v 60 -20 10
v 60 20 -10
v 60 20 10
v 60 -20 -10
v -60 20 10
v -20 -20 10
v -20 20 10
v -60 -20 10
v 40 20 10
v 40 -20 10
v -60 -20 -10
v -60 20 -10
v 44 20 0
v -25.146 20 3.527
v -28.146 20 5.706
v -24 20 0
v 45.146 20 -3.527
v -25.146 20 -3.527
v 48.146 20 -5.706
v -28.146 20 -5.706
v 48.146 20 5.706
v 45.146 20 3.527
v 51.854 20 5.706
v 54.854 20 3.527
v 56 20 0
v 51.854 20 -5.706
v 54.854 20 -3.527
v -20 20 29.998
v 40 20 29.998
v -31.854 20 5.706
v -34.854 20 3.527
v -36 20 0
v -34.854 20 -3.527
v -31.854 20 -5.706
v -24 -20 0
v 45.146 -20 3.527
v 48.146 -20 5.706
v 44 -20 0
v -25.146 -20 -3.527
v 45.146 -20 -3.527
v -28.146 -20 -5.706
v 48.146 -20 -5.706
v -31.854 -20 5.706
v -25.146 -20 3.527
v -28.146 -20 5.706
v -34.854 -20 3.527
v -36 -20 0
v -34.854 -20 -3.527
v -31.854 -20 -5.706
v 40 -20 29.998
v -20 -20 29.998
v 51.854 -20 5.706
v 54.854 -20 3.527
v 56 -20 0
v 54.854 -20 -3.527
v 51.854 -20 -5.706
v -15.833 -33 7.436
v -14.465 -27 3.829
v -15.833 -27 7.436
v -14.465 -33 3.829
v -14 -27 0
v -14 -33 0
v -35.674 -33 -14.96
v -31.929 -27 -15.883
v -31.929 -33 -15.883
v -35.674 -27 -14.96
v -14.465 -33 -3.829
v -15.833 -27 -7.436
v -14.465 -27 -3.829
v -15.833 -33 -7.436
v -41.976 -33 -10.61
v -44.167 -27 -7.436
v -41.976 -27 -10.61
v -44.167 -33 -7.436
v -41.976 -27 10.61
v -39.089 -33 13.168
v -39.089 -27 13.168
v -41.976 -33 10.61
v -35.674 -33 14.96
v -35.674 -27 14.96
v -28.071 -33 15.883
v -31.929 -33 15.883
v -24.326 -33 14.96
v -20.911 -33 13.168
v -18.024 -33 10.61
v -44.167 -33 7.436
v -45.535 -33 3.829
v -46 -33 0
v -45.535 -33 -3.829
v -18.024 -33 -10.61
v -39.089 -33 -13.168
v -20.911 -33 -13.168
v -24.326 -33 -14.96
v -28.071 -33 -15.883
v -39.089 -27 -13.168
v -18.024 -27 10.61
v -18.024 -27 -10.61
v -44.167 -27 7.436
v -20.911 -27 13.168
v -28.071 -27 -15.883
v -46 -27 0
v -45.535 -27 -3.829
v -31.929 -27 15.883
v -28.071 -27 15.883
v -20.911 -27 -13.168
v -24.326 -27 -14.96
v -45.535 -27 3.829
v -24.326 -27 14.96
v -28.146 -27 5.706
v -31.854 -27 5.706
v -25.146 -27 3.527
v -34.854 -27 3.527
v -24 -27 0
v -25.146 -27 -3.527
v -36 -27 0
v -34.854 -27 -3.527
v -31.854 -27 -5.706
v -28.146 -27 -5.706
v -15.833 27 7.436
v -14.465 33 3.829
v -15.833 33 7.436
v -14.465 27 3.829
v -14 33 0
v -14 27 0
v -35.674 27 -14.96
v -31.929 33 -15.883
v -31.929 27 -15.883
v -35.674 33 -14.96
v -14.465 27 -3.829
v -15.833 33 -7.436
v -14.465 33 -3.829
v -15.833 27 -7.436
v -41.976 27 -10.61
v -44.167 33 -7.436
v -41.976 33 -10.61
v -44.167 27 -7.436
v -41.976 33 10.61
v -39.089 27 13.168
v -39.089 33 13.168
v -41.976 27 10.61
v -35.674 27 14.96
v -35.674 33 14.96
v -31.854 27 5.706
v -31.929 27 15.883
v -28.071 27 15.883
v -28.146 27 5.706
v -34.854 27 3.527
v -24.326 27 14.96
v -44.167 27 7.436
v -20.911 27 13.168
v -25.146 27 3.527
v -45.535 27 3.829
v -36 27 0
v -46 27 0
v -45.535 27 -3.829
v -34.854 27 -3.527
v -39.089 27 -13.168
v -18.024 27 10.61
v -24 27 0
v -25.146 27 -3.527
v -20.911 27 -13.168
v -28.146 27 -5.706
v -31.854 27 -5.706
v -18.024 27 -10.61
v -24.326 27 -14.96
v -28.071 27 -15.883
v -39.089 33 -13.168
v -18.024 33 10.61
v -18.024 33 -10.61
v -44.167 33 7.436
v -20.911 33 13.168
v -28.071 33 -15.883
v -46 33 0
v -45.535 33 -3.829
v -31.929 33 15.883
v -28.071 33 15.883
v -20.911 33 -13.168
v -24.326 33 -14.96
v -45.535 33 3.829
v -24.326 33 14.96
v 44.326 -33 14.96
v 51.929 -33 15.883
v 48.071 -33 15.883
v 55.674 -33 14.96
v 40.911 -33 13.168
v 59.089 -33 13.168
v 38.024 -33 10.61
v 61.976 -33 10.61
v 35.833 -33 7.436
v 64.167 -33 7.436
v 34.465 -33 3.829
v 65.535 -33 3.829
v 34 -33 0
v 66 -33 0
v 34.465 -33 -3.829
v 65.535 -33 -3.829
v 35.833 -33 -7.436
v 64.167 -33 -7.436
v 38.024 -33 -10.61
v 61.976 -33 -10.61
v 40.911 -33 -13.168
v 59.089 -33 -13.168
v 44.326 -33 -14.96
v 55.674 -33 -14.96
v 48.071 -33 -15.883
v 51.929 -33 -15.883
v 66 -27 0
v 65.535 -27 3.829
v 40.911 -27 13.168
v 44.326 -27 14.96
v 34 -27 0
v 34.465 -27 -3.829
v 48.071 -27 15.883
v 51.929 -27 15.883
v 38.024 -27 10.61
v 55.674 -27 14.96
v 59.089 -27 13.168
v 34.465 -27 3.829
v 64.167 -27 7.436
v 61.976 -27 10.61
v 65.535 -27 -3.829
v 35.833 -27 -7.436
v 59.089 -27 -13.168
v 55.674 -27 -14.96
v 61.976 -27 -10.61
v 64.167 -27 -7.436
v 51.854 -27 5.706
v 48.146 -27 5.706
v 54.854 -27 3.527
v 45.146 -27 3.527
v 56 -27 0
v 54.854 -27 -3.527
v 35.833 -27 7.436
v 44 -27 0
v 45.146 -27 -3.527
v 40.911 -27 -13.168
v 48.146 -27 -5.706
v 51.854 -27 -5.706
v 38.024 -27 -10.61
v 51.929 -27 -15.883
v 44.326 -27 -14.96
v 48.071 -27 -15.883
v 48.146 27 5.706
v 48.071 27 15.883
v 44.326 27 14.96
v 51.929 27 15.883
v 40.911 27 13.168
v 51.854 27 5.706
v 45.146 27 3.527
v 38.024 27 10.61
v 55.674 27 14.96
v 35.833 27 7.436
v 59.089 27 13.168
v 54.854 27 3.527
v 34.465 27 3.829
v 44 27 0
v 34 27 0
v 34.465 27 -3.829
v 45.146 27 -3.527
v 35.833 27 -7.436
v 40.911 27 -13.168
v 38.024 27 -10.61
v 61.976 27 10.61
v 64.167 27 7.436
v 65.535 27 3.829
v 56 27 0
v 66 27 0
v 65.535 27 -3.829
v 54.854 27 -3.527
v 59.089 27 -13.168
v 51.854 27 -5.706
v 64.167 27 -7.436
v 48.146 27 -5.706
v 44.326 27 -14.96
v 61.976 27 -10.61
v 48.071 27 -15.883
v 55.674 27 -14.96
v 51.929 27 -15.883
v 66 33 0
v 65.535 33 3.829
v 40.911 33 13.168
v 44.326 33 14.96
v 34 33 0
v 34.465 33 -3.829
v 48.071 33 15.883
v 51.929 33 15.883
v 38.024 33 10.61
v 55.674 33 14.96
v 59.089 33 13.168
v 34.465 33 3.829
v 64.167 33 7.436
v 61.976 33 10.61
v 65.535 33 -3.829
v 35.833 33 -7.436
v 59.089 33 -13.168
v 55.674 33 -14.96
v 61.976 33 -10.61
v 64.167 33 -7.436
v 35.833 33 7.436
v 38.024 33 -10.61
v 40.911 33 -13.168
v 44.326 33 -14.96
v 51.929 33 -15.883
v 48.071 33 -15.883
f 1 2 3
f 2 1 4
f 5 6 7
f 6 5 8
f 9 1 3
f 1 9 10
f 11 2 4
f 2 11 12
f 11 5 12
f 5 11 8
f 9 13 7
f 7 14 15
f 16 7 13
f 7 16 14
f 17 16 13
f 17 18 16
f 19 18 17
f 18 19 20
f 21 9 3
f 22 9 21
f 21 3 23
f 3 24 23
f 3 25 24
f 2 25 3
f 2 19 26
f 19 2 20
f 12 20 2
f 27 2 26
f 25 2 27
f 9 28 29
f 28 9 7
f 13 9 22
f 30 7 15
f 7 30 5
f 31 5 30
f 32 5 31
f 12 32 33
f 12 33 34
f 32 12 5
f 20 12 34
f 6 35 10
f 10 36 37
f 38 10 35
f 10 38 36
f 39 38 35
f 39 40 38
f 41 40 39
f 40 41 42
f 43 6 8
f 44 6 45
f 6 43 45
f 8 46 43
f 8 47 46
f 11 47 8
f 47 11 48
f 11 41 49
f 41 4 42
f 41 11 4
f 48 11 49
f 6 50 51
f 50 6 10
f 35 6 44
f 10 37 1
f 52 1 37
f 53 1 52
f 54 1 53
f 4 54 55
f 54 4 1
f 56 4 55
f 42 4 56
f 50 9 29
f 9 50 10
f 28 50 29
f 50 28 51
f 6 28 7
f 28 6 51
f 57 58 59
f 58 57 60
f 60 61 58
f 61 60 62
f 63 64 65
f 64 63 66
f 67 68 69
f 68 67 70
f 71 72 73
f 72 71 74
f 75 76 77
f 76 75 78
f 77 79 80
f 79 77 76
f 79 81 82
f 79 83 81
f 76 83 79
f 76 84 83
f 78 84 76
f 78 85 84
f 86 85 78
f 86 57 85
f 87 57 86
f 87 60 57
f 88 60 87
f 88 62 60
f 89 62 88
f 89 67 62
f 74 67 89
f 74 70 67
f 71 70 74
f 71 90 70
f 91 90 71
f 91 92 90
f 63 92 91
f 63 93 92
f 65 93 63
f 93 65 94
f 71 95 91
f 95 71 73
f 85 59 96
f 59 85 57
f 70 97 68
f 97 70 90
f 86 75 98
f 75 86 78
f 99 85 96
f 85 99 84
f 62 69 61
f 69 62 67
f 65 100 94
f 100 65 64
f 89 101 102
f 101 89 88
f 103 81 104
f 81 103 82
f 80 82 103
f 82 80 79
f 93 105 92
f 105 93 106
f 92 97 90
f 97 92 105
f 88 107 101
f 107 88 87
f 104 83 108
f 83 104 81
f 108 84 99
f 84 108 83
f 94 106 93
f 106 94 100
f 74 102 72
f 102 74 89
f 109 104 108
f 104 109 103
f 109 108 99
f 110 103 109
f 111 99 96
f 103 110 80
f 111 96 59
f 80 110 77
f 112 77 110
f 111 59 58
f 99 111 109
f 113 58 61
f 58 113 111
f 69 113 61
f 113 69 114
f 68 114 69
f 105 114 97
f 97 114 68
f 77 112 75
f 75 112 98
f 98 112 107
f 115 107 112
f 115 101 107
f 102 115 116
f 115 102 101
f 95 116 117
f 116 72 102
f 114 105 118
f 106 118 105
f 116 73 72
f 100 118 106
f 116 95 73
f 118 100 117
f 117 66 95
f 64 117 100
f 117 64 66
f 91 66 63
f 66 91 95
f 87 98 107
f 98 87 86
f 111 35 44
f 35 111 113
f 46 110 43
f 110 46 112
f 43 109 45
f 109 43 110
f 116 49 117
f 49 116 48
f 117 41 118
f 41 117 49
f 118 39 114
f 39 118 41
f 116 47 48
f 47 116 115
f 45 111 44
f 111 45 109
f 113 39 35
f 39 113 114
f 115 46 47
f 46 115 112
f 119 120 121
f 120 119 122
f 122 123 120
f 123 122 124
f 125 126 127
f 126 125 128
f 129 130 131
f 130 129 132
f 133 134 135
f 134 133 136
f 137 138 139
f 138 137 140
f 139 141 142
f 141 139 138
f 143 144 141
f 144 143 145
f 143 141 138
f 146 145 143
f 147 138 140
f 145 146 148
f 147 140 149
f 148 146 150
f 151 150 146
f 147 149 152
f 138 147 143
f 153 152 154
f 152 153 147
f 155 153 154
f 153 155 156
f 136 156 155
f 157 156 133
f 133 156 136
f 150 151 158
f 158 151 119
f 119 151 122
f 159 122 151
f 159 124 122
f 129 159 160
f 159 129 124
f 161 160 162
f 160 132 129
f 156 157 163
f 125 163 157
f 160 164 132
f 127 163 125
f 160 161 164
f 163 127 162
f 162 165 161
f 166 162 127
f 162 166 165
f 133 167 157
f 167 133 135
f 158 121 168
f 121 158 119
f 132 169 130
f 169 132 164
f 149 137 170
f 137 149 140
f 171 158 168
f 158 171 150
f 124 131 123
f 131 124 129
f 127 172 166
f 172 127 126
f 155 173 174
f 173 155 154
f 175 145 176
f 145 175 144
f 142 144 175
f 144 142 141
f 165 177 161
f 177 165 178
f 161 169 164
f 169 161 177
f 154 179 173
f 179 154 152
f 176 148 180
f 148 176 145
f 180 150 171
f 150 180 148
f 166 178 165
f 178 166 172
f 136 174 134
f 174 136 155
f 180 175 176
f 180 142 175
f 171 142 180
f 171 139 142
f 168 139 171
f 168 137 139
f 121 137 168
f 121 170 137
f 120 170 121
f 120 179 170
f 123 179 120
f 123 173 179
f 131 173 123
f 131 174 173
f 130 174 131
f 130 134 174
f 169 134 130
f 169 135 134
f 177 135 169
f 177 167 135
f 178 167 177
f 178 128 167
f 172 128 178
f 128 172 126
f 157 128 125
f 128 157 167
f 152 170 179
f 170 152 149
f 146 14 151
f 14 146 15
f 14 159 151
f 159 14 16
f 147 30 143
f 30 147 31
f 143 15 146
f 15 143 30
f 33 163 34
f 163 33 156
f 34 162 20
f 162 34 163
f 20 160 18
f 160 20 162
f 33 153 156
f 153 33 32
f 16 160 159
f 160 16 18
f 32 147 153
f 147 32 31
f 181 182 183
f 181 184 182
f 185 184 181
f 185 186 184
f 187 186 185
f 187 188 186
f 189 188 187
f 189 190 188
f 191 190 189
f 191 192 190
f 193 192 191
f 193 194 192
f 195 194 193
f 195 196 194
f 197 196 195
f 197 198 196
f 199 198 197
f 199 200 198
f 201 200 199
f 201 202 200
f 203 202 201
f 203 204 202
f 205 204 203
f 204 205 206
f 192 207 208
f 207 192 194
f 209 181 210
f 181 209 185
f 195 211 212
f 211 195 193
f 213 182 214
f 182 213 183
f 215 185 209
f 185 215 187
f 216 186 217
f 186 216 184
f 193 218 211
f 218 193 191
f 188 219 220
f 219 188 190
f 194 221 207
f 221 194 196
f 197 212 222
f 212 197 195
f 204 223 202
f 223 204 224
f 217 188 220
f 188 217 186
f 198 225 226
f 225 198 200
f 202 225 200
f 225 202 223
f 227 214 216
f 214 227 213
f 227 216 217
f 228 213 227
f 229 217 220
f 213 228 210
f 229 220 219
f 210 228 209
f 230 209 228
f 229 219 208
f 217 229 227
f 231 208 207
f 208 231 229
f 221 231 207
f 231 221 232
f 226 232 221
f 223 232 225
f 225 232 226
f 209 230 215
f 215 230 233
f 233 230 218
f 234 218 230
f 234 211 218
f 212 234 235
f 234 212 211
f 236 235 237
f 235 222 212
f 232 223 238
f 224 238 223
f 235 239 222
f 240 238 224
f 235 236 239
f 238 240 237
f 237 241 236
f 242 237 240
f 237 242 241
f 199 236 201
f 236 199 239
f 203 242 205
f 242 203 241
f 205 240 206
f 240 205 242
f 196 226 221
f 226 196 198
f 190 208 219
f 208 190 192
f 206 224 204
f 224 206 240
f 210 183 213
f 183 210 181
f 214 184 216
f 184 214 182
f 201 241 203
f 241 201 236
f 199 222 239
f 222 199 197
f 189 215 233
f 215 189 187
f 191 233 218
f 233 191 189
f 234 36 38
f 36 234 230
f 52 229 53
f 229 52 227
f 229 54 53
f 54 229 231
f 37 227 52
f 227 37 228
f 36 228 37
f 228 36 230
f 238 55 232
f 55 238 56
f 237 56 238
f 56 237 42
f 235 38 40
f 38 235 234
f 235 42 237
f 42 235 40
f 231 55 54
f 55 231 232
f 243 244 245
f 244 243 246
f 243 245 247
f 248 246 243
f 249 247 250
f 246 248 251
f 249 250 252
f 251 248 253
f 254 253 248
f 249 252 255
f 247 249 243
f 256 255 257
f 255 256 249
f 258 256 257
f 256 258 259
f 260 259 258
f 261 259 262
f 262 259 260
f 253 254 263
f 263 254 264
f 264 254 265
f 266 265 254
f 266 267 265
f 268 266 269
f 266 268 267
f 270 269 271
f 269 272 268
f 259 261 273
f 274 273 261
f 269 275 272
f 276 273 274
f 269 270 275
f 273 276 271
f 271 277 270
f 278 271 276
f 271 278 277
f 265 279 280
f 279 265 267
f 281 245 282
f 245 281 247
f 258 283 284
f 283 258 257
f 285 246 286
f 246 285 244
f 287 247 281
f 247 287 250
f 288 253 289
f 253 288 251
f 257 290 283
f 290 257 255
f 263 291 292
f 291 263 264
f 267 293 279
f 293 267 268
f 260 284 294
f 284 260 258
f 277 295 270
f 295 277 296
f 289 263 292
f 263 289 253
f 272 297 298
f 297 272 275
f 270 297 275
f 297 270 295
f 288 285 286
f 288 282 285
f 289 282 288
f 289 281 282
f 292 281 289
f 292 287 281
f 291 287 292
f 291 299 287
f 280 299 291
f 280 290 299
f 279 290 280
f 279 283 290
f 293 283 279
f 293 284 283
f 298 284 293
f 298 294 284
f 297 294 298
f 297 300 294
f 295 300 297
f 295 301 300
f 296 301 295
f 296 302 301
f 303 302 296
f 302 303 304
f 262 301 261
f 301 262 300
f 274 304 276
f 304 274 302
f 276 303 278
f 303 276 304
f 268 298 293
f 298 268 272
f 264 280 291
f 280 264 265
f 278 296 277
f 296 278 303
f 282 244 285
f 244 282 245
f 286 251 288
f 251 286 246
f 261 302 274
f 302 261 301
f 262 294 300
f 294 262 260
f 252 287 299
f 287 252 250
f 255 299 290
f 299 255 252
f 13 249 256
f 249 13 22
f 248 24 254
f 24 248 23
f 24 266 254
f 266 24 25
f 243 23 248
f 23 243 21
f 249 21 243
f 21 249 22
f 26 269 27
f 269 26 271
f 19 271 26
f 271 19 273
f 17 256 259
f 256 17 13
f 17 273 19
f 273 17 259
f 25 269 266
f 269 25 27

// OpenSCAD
// Chapter Two

// https://openscad.org/documentation.html#tutorial
// https://en.wikibooks.org/wiki/OpenSCAD_Tutorial/Chapter_2

// Scaling everything

// resolution settings
// $fa = 1;
// $fs = 0.4;

wheel = 8; // whell radius
axel = 3;  // axel radius

// scales

// not scalled
// s1 = [1,1,1];
// s1 = [ 1.2, 1, 1 ];
// s1 = [ 1.2, 0.5, 1 ];
// s1 = [ 1, 0.5, 1 ];

// s1 = [ 1.2, 0.2, 1 ]; // x != z => eliptic wheels
// s1 = [ 1.2, 0.2, 1.2 ]; // x = z => non-eliptic wheels

s1 = [ 2, 2, 2 ]; // double size

// car chassis
// body base
scale(s1) {
    cube([ 60, 20, 10 ], center = true);

    translate([ 5, 0, 10 - 1E-3 ]) 
        cube([ 30, 20, 10 ], center = true);

    // front wheel left
    translate([ -15, -15, 0 ]) 
        rotate([ 90, 0, 0 ])
        cylinder(h = 3, r = wheel, , center = true);

    // front axel left
    translate([ -15, -10, 0 ]) 
    rotate([ 90, 0, 0 ])
        cylinder(h = 7, r = axel, , center = true);
    // front wheel right
    translate([ -15, 15, 0 ]) 
    rotate([ 90, 0, 0 ])
        cylinder(h = 3, r = wheel, center = true);

    // front axel right
    translate([ -15, 10, 0 ]) 
    rotate([ 90, 0, 0 ])
        cylinder(h = 7, r = axel, , center = true);

    // back wheel left
    translate([ 25, -15, 0 ]) 
    rotate([ 90, 0, 0 ])
        cylinder(h = 3, r = wheel, center = true);

    // back axel left
    translate([ 25, -10, 0 ]) 
    rotate([ 90, 0, 0 ])
        cylinder(h = 7, r = axel, , center = true);

    // back wheel right
    translate([ 25, 15, 0 ]) 
    rotate([ 90, 0, 0 ])
        cylinder(h = 3, r = wheel, center = true);

    // back axel right
    translate([ 25, 10, 0 ]) 
    rotate([ 90, 0, 0 ])
        cylinder(h = 7, r = axel, , center = true);
}
